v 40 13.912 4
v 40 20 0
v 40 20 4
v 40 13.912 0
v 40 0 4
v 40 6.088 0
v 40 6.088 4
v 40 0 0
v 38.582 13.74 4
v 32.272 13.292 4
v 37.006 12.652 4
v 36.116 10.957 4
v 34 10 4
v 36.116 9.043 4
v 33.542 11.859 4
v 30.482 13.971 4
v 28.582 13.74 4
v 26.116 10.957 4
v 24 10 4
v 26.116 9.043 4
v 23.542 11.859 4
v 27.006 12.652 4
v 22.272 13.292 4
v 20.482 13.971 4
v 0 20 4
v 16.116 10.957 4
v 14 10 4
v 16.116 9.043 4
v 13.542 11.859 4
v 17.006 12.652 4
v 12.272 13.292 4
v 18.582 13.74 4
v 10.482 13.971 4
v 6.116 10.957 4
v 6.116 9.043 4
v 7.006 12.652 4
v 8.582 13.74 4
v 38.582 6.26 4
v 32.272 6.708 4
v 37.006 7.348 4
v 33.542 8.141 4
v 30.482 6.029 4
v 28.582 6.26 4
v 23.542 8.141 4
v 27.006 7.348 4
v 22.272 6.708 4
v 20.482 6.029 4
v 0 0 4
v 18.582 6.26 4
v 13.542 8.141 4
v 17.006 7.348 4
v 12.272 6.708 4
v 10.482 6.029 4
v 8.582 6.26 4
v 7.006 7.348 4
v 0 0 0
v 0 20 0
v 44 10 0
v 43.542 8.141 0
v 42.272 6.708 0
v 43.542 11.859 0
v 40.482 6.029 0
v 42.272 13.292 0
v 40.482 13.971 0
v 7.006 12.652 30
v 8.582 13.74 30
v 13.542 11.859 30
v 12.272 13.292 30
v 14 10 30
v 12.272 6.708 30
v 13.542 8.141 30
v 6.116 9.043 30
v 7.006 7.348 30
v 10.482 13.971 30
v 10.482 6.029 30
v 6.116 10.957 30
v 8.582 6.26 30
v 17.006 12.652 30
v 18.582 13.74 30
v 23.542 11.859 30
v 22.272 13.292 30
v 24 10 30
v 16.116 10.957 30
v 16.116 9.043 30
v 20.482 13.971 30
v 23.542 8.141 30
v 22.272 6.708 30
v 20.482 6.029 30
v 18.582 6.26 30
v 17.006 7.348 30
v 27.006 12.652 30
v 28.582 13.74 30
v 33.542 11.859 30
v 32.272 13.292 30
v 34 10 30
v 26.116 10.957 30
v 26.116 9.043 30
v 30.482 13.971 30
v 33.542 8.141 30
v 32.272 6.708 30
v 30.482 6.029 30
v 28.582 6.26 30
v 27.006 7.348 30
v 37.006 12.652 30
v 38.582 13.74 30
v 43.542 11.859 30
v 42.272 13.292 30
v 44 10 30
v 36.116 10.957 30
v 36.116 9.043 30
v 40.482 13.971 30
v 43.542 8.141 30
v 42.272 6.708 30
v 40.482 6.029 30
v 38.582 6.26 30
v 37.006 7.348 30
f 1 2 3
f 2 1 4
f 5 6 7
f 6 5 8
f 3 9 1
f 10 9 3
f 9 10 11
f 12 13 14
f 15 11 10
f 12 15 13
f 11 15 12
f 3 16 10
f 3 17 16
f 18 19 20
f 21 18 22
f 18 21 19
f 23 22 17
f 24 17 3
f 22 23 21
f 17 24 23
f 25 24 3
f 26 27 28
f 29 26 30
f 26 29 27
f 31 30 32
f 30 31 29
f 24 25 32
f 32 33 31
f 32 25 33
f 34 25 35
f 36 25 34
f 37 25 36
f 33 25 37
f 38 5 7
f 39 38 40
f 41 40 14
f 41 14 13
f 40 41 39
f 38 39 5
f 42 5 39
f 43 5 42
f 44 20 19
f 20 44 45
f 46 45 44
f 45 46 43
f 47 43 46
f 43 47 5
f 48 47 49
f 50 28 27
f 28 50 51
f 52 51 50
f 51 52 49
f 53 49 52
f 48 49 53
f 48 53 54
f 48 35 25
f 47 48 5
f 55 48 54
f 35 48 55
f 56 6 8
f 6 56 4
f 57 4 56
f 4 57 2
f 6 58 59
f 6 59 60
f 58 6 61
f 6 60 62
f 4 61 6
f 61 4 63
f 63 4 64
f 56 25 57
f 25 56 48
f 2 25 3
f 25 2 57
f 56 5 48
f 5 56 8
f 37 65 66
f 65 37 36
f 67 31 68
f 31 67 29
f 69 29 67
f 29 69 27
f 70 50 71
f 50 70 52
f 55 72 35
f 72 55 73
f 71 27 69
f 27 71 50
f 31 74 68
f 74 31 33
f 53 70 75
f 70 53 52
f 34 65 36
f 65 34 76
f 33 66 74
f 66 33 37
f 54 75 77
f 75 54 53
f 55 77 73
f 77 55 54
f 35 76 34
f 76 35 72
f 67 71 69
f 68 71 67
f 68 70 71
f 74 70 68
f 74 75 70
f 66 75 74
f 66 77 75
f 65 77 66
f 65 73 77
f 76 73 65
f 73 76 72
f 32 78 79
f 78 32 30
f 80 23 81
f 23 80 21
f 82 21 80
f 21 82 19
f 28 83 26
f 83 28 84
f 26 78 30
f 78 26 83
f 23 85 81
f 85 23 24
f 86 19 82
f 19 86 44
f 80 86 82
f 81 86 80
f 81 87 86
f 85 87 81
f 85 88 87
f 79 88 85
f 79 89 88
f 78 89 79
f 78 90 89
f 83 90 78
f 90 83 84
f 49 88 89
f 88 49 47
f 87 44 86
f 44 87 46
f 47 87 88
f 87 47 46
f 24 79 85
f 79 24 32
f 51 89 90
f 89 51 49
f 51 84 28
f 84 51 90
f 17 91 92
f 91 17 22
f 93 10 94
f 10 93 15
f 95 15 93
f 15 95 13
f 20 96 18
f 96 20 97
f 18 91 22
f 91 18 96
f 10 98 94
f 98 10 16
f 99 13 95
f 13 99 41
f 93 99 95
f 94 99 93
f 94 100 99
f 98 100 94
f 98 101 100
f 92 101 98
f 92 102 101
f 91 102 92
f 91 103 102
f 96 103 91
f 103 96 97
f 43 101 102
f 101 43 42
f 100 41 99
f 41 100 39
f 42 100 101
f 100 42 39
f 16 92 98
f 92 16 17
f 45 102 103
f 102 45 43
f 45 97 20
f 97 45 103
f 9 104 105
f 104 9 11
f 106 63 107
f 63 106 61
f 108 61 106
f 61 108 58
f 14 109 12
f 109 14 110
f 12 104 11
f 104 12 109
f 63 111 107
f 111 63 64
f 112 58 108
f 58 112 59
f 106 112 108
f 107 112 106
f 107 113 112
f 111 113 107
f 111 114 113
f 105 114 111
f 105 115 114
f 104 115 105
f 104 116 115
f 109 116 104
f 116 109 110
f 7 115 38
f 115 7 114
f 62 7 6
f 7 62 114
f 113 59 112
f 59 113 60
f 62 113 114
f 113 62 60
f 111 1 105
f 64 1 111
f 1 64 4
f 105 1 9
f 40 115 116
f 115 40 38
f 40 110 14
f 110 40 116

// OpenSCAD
cube([40,20,4]);

translate([10,10,0]) cylinder(d=8, h=30);
translate([20,10,0]) cylinder(d=8, h=30);
translate([30,10,0]) cylinder(d=8, h=30);
translate([40,10,0]) cylinder(d=8, h=30);
